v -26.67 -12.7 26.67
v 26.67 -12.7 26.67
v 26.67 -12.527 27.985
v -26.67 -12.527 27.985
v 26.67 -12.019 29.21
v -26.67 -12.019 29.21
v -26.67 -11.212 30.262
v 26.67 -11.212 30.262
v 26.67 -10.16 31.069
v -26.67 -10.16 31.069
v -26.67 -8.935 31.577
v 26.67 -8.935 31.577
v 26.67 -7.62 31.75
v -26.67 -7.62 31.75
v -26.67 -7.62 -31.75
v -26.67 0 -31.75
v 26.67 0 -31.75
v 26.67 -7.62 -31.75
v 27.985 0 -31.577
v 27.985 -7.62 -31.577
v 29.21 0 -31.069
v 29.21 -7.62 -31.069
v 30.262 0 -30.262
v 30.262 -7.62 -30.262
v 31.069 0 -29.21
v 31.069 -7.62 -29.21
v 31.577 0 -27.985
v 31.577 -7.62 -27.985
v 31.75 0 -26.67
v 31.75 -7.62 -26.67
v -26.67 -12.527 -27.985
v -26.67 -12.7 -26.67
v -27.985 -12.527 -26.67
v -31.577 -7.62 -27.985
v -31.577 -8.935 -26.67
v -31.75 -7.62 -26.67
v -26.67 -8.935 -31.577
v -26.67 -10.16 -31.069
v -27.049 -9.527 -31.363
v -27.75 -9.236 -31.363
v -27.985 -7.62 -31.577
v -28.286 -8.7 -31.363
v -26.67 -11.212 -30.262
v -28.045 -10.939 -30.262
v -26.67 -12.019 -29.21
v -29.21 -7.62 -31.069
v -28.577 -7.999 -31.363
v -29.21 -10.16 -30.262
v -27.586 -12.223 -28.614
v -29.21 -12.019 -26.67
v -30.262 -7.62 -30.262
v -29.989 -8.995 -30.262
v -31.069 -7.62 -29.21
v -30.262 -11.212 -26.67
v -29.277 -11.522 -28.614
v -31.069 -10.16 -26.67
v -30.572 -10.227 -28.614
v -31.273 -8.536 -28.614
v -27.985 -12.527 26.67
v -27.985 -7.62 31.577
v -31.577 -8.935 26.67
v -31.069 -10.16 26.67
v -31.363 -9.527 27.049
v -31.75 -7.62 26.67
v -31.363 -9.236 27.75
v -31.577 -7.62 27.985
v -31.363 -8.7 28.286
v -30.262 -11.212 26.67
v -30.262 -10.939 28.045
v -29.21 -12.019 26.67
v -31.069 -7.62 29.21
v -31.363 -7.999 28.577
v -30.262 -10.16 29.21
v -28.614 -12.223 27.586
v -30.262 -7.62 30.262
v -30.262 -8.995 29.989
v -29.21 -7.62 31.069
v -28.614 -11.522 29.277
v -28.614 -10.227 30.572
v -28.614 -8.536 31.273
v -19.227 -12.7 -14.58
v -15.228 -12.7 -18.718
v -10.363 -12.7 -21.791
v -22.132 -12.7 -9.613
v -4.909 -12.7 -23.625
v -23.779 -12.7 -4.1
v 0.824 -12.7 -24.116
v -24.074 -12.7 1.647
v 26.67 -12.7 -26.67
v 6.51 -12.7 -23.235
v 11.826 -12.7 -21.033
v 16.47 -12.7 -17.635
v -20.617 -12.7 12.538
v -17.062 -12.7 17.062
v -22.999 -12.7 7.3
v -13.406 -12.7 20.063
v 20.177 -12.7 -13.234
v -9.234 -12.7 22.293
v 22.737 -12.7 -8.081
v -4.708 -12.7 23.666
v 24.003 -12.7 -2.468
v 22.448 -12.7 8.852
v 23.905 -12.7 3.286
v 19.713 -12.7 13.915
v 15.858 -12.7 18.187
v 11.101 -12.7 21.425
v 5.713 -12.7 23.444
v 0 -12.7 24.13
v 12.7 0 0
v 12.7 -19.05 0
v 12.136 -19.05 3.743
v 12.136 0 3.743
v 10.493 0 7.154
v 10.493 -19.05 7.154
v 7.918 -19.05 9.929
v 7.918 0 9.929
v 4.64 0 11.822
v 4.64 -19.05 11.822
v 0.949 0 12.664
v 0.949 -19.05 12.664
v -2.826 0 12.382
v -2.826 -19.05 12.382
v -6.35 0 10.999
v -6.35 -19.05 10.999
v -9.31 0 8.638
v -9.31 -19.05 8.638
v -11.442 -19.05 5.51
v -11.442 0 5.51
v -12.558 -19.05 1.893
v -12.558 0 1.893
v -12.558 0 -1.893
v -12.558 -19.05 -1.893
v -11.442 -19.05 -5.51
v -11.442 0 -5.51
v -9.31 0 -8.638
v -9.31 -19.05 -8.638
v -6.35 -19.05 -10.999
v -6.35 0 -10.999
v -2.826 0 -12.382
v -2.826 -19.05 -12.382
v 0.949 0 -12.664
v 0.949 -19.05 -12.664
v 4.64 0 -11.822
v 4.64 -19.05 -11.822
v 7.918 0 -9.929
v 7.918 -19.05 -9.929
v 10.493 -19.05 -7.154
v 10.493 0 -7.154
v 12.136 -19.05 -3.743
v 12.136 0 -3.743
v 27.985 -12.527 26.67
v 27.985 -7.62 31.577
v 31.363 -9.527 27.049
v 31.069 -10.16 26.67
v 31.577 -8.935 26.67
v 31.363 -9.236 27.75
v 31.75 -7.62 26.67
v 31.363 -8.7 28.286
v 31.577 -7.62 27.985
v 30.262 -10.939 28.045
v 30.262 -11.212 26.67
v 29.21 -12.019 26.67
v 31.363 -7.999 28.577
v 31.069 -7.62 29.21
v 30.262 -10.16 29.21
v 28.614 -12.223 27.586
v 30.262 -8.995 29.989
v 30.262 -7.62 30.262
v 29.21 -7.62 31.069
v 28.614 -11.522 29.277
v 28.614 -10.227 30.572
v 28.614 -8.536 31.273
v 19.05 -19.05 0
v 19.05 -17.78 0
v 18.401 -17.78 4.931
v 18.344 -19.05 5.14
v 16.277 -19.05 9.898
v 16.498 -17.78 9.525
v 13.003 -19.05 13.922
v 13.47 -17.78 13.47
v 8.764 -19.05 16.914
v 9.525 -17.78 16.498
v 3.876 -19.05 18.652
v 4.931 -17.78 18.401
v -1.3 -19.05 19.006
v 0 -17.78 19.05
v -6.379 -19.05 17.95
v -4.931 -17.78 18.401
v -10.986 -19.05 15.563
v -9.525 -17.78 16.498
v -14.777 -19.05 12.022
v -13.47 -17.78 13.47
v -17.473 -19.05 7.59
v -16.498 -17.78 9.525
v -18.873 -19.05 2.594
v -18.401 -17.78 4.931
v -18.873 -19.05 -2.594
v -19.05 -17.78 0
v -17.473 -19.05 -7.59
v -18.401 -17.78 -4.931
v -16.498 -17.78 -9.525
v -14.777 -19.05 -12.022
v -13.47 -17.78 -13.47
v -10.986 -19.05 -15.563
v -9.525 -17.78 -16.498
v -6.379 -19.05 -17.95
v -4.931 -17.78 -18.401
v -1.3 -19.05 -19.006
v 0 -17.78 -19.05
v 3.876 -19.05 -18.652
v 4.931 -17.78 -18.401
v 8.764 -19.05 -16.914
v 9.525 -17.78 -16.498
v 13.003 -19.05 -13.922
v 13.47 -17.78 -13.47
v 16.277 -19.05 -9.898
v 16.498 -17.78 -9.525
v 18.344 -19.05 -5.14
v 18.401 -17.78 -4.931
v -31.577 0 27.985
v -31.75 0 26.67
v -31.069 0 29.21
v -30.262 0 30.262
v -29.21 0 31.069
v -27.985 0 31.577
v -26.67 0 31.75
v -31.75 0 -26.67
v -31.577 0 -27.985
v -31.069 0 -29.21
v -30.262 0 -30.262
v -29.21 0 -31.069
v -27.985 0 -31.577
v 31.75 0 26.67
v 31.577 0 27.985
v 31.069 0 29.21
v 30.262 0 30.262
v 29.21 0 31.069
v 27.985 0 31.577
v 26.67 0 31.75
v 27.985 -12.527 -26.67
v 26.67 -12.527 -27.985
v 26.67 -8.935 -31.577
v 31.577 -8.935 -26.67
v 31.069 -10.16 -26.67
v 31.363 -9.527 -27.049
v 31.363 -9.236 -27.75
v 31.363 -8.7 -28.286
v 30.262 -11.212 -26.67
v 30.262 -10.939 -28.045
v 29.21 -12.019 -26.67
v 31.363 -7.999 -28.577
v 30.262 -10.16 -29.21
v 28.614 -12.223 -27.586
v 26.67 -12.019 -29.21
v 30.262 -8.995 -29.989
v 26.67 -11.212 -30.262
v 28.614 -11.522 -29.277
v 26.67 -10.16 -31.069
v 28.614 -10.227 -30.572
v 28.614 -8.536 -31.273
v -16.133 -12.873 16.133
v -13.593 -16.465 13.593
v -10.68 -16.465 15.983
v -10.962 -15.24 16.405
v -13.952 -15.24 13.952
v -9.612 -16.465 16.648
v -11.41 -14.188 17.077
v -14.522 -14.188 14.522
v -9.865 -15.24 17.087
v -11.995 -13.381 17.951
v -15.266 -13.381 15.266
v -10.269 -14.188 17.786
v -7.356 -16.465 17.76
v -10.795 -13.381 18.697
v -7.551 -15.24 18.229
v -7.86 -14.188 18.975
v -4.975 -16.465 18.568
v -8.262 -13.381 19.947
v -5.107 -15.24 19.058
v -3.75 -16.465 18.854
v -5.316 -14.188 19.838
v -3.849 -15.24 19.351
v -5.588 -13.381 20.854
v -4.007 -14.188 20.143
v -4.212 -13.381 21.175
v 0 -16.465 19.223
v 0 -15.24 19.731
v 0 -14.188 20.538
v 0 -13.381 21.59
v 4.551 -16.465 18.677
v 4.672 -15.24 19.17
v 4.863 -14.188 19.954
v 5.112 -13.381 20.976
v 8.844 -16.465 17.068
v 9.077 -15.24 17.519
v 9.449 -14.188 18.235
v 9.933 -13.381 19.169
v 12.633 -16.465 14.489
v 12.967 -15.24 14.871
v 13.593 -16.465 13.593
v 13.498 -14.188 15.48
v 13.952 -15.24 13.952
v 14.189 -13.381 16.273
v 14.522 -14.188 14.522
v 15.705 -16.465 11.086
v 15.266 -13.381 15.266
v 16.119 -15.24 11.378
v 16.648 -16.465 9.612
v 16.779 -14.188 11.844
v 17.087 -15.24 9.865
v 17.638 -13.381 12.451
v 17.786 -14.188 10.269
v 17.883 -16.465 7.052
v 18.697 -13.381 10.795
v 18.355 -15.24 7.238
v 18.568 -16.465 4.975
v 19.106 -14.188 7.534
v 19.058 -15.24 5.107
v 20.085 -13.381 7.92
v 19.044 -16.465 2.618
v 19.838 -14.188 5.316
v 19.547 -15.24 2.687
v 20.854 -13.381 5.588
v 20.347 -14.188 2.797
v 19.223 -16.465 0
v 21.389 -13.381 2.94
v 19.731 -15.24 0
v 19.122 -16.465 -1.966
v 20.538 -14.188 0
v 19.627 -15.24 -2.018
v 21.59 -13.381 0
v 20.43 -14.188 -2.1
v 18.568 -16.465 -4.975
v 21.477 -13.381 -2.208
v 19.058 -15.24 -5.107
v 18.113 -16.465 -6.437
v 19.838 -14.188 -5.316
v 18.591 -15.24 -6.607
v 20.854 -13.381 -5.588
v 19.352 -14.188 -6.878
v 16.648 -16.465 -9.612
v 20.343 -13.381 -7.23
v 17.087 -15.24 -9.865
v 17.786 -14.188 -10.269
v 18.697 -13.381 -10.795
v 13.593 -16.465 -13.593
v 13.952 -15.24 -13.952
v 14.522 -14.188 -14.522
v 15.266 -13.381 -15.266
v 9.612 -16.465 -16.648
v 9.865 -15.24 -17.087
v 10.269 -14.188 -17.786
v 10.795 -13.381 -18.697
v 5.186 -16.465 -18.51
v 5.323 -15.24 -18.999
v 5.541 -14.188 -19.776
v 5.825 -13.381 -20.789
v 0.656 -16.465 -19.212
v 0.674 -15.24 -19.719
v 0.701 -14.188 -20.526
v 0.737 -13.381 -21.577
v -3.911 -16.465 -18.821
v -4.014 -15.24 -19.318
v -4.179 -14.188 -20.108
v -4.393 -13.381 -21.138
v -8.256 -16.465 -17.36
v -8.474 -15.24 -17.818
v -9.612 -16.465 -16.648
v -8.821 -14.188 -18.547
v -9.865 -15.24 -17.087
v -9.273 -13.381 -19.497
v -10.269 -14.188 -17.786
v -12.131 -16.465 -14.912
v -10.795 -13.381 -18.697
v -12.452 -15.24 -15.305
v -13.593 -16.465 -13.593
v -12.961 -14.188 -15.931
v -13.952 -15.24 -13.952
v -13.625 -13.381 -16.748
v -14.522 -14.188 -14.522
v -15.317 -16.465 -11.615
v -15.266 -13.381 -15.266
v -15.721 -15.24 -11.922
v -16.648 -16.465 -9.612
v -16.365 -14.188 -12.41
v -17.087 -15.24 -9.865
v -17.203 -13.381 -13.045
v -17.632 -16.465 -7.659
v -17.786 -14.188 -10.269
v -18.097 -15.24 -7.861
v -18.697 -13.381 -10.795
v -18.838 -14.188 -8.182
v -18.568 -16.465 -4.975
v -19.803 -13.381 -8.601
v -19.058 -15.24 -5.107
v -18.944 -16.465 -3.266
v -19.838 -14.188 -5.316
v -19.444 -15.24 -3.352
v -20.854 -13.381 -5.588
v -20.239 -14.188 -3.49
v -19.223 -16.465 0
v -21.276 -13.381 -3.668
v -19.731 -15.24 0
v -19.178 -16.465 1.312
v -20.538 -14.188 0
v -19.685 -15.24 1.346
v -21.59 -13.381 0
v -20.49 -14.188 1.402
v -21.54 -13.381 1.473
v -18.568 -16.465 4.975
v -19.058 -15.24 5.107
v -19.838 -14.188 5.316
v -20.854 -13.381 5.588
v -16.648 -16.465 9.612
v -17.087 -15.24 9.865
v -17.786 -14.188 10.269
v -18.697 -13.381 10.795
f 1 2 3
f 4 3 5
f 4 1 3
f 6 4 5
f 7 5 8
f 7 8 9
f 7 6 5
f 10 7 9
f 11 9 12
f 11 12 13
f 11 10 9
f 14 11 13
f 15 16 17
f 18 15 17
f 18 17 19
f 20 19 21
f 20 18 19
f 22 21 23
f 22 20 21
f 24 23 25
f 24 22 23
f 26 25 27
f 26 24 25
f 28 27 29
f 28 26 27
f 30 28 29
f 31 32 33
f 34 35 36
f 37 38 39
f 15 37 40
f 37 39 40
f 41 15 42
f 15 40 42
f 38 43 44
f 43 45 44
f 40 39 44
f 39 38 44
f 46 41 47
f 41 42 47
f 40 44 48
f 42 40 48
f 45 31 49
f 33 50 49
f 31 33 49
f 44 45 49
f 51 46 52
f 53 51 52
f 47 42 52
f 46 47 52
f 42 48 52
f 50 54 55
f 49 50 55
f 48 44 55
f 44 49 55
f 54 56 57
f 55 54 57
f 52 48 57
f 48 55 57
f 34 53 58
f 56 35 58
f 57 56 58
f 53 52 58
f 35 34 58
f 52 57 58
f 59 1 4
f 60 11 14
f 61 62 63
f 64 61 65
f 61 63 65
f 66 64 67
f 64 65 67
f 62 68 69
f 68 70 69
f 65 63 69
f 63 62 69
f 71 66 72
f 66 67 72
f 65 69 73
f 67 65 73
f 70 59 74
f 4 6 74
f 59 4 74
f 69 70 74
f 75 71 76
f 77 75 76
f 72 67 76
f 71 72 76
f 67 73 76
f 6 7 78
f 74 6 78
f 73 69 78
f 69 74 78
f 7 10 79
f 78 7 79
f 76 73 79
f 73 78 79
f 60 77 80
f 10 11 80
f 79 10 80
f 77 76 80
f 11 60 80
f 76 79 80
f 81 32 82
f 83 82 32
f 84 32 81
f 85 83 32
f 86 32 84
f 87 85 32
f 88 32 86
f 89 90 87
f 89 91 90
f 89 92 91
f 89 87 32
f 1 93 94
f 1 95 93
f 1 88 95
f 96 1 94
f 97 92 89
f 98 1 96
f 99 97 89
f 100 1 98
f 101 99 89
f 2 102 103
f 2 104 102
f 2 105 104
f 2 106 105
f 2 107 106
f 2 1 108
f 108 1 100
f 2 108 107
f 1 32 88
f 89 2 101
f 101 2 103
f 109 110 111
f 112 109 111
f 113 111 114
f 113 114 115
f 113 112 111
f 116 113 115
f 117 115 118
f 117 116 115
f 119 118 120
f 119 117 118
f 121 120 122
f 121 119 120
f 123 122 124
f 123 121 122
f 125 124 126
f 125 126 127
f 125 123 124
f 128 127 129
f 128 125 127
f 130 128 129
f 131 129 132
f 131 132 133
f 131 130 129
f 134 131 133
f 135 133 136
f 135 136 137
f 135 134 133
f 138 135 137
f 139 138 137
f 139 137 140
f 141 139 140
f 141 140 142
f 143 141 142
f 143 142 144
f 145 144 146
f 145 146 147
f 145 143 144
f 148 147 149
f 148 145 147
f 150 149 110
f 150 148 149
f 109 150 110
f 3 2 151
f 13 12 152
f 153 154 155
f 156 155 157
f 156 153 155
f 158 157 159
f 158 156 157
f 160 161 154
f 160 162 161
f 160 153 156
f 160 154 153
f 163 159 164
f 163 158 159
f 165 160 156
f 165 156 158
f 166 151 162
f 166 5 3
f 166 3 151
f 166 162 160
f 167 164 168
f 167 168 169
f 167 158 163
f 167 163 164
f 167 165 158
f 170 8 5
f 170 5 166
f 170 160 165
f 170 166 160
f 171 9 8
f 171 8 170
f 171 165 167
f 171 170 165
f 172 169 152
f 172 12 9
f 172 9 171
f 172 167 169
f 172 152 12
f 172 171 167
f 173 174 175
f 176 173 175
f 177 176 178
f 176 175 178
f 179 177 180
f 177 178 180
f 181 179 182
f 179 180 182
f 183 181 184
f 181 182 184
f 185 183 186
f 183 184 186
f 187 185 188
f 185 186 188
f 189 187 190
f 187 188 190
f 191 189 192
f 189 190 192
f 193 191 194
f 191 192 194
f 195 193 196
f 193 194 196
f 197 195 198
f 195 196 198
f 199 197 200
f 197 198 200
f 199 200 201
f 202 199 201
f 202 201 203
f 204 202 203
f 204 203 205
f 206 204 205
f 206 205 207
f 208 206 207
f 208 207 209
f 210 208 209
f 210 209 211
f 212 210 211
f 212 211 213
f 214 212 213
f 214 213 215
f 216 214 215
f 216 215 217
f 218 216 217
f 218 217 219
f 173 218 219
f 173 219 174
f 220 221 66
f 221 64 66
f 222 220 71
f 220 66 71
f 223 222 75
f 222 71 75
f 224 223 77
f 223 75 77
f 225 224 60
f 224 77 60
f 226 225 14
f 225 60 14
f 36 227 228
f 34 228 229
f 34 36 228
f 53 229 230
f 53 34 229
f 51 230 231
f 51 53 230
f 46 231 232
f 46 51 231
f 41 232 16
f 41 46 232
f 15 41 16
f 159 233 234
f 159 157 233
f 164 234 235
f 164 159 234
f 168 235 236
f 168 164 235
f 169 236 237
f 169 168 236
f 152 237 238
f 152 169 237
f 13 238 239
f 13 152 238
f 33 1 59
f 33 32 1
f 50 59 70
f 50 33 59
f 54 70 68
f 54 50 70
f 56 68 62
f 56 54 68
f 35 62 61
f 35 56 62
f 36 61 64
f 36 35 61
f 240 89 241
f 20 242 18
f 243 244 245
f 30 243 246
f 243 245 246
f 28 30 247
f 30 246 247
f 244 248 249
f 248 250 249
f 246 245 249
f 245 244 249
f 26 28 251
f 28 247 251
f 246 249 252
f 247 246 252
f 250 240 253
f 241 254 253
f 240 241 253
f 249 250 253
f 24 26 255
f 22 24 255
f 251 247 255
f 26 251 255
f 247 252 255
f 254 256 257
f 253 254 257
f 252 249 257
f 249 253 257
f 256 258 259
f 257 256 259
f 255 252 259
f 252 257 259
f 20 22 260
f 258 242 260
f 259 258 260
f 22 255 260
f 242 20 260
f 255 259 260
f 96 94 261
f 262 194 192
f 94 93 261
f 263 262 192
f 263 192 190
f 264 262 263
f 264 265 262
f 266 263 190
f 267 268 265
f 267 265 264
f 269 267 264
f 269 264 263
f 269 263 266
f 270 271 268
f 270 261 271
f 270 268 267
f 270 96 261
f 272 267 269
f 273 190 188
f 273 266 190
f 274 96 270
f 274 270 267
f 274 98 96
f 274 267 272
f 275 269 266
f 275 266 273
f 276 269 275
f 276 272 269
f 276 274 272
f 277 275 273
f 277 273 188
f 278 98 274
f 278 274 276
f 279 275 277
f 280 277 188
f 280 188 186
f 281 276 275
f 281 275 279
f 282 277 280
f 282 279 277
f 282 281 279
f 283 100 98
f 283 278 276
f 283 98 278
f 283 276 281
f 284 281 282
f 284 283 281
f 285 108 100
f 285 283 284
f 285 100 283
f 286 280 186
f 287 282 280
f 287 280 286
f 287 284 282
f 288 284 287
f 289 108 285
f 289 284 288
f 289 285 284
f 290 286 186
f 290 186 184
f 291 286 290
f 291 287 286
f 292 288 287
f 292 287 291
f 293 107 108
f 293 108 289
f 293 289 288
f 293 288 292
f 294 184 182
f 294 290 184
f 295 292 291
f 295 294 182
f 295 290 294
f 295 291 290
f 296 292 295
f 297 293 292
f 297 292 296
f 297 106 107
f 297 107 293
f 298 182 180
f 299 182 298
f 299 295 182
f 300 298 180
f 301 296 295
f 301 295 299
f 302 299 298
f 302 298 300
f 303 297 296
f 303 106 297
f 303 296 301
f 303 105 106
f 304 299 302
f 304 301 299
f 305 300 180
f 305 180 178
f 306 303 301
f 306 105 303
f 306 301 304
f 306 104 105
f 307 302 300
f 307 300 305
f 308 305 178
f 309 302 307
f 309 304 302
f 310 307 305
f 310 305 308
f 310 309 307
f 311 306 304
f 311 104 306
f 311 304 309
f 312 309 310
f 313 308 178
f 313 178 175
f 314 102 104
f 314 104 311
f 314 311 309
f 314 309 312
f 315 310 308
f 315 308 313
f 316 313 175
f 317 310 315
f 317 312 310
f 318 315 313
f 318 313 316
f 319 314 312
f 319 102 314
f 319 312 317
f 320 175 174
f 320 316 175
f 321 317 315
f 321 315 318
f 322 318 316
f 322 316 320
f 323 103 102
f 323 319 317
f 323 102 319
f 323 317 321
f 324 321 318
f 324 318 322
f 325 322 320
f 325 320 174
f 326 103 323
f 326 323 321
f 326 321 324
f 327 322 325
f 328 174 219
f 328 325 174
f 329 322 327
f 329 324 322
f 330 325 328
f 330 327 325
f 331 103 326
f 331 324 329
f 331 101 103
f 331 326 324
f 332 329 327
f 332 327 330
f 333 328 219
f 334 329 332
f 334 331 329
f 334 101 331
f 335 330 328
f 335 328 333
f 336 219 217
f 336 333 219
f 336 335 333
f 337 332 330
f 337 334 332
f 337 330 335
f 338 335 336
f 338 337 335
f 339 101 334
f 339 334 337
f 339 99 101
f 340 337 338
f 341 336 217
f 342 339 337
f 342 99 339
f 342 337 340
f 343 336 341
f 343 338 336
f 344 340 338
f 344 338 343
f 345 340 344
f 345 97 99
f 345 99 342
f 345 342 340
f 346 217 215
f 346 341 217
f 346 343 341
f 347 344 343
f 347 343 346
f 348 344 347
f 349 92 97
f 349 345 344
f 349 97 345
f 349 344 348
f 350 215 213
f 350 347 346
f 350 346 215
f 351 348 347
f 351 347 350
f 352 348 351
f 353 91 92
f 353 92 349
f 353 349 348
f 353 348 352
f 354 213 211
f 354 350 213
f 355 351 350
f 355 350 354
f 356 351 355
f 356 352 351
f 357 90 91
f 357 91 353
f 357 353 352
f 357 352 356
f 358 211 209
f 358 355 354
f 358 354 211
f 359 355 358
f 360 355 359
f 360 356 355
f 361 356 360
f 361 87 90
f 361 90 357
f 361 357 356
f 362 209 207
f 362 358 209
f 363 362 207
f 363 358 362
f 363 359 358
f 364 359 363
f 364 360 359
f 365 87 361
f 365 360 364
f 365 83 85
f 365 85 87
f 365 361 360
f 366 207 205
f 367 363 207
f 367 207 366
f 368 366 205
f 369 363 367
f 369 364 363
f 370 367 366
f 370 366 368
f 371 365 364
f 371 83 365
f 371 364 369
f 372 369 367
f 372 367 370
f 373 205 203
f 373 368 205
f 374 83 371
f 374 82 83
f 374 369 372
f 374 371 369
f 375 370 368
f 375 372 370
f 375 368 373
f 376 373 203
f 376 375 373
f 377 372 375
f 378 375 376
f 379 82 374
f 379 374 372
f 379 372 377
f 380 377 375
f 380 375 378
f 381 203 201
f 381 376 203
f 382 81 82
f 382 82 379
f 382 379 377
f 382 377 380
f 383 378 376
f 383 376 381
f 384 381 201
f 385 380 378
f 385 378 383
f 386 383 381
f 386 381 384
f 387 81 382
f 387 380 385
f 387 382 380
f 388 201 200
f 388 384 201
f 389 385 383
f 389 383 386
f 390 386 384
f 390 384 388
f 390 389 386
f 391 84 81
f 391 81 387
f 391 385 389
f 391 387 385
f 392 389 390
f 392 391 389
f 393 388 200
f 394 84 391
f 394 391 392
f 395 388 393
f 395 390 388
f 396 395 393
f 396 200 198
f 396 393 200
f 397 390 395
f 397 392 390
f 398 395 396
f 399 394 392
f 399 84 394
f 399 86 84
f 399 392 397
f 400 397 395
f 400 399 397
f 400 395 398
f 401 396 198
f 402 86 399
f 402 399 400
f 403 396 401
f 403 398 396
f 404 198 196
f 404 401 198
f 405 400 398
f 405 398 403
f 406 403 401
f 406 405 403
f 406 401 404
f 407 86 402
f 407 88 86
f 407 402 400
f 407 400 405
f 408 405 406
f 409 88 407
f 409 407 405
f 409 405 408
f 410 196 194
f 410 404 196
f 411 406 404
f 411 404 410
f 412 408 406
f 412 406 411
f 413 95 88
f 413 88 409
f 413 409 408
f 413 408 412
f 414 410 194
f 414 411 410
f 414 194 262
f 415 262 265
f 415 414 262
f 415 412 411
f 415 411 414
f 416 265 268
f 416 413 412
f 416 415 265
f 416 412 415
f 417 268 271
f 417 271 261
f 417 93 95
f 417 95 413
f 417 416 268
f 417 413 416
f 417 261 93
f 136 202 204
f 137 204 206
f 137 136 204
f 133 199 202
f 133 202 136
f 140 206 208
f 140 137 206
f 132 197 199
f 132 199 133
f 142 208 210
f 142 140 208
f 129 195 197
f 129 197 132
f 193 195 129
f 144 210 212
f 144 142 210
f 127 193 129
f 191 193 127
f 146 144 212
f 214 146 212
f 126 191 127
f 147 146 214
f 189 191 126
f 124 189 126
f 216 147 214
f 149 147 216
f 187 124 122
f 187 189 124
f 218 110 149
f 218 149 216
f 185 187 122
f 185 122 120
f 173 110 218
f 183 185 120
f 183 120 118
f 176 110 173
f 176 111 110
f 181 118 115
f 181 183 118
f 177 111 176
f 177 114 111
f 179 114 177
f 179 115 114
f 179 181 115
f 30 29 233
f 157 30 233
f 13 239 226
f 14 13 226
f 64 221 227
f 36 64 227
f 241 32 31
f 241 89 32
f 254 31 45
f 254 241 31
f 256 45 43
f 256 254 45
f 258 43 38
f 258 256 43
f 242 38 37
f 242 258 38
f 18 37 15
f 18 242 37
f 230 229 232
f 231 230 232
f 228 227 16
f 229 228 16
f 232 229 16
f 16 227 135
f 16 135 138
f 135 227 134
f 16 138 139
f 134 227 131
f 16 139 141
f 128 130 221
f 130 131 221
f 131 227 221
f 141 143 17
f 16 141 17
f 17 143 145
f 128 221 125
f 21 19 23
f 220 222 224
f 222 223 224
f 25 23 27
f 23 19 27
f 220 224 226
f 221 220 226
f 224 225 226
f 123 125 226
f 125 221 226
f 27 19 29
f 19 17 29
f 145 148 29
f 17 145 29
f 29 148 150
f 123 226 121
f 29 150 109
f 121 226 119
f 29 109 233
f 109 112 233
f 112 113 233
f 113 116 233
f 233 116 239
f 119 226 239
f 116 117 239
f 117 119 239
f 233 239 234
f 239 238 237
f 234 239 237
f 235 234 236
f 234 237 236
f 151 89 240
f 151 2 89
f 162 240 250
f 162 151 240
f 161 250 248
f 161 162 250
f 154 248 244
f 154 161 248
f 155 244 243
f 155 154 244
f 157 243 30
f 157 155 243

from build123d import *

# Parameters (mm, degrees)
F1_DEPTH = 12.7
F2_R     = 19.05
F2_R_2   = 12.7
F3_DEPTH = 19.05
F4_R     = 5.08


with BuildPart() as f1:
    # F0 (on Front) → F1 (new body)
    with BuildSketch(Plane.XZ):
        with BuildLine():
            Line((0, 31.75), (0, 19.05))
            ThreePointArc((0, 19.05), (13.4703841816, 13.4703841816), (19.05, 0))
            ThreePointArc((19.05, 0), (-7.2901193866, -17.5999050943), (-13.4703841816, 13.4703841816))
            Line((-13.4703841816, 13.4703841816), (-31.75, 31.75))
            Line((-31.75, 31.75), (-31.75, -31.75))
            Line((-31.75, -31.75), (31.75, -31.75))
            Line((31.75, -31.75), (31.75, 31.75))
            Line((31.75, 31.75), (0, 31.75))
        make_face()
        with BuildLine():
            ThreePointArc((-13.4703841816, 13.4703841816), (-7.2901193866, 17.5999050943), (0, 19.05))
            Line((0, 19.05), (0, 31.75))
            Line((0, 31.75), (-31.75, 31.75))
            Line((-31.75, 31.75), (-13.4703841816, 13.4703841816))
        make_face()
    extrude(amount=F1_DEPTH)

    # F2 (on Front) → F3 (join)
    with BuildSketch(Plane.XZ):
        Circle(F2_R)
        Circle(F2_R_2, mode=Mode.SUBTRACT)
    extrude(amount=F3_DEPTH)

    # F4
    f4_edges = [f1.edges().sort_by_distance(p)[0] for p in [
        (-19.05, -12.7, 0),
        (0, -12.7, 31.75),
        (-31.75, -12.7, 0),
        (0, -12.7, -31.75),
        (31.75, -12.7, 0),
        (31.75, -6.35, 31.75),
        (-31.75, -6.35, 31.75),
        (-31.75, -6.35, -31.75),
        (31.75, -6.35, -31.75),
    ]]
    fillet(f4_edges, radius=F4_R)


solid = f1.part
